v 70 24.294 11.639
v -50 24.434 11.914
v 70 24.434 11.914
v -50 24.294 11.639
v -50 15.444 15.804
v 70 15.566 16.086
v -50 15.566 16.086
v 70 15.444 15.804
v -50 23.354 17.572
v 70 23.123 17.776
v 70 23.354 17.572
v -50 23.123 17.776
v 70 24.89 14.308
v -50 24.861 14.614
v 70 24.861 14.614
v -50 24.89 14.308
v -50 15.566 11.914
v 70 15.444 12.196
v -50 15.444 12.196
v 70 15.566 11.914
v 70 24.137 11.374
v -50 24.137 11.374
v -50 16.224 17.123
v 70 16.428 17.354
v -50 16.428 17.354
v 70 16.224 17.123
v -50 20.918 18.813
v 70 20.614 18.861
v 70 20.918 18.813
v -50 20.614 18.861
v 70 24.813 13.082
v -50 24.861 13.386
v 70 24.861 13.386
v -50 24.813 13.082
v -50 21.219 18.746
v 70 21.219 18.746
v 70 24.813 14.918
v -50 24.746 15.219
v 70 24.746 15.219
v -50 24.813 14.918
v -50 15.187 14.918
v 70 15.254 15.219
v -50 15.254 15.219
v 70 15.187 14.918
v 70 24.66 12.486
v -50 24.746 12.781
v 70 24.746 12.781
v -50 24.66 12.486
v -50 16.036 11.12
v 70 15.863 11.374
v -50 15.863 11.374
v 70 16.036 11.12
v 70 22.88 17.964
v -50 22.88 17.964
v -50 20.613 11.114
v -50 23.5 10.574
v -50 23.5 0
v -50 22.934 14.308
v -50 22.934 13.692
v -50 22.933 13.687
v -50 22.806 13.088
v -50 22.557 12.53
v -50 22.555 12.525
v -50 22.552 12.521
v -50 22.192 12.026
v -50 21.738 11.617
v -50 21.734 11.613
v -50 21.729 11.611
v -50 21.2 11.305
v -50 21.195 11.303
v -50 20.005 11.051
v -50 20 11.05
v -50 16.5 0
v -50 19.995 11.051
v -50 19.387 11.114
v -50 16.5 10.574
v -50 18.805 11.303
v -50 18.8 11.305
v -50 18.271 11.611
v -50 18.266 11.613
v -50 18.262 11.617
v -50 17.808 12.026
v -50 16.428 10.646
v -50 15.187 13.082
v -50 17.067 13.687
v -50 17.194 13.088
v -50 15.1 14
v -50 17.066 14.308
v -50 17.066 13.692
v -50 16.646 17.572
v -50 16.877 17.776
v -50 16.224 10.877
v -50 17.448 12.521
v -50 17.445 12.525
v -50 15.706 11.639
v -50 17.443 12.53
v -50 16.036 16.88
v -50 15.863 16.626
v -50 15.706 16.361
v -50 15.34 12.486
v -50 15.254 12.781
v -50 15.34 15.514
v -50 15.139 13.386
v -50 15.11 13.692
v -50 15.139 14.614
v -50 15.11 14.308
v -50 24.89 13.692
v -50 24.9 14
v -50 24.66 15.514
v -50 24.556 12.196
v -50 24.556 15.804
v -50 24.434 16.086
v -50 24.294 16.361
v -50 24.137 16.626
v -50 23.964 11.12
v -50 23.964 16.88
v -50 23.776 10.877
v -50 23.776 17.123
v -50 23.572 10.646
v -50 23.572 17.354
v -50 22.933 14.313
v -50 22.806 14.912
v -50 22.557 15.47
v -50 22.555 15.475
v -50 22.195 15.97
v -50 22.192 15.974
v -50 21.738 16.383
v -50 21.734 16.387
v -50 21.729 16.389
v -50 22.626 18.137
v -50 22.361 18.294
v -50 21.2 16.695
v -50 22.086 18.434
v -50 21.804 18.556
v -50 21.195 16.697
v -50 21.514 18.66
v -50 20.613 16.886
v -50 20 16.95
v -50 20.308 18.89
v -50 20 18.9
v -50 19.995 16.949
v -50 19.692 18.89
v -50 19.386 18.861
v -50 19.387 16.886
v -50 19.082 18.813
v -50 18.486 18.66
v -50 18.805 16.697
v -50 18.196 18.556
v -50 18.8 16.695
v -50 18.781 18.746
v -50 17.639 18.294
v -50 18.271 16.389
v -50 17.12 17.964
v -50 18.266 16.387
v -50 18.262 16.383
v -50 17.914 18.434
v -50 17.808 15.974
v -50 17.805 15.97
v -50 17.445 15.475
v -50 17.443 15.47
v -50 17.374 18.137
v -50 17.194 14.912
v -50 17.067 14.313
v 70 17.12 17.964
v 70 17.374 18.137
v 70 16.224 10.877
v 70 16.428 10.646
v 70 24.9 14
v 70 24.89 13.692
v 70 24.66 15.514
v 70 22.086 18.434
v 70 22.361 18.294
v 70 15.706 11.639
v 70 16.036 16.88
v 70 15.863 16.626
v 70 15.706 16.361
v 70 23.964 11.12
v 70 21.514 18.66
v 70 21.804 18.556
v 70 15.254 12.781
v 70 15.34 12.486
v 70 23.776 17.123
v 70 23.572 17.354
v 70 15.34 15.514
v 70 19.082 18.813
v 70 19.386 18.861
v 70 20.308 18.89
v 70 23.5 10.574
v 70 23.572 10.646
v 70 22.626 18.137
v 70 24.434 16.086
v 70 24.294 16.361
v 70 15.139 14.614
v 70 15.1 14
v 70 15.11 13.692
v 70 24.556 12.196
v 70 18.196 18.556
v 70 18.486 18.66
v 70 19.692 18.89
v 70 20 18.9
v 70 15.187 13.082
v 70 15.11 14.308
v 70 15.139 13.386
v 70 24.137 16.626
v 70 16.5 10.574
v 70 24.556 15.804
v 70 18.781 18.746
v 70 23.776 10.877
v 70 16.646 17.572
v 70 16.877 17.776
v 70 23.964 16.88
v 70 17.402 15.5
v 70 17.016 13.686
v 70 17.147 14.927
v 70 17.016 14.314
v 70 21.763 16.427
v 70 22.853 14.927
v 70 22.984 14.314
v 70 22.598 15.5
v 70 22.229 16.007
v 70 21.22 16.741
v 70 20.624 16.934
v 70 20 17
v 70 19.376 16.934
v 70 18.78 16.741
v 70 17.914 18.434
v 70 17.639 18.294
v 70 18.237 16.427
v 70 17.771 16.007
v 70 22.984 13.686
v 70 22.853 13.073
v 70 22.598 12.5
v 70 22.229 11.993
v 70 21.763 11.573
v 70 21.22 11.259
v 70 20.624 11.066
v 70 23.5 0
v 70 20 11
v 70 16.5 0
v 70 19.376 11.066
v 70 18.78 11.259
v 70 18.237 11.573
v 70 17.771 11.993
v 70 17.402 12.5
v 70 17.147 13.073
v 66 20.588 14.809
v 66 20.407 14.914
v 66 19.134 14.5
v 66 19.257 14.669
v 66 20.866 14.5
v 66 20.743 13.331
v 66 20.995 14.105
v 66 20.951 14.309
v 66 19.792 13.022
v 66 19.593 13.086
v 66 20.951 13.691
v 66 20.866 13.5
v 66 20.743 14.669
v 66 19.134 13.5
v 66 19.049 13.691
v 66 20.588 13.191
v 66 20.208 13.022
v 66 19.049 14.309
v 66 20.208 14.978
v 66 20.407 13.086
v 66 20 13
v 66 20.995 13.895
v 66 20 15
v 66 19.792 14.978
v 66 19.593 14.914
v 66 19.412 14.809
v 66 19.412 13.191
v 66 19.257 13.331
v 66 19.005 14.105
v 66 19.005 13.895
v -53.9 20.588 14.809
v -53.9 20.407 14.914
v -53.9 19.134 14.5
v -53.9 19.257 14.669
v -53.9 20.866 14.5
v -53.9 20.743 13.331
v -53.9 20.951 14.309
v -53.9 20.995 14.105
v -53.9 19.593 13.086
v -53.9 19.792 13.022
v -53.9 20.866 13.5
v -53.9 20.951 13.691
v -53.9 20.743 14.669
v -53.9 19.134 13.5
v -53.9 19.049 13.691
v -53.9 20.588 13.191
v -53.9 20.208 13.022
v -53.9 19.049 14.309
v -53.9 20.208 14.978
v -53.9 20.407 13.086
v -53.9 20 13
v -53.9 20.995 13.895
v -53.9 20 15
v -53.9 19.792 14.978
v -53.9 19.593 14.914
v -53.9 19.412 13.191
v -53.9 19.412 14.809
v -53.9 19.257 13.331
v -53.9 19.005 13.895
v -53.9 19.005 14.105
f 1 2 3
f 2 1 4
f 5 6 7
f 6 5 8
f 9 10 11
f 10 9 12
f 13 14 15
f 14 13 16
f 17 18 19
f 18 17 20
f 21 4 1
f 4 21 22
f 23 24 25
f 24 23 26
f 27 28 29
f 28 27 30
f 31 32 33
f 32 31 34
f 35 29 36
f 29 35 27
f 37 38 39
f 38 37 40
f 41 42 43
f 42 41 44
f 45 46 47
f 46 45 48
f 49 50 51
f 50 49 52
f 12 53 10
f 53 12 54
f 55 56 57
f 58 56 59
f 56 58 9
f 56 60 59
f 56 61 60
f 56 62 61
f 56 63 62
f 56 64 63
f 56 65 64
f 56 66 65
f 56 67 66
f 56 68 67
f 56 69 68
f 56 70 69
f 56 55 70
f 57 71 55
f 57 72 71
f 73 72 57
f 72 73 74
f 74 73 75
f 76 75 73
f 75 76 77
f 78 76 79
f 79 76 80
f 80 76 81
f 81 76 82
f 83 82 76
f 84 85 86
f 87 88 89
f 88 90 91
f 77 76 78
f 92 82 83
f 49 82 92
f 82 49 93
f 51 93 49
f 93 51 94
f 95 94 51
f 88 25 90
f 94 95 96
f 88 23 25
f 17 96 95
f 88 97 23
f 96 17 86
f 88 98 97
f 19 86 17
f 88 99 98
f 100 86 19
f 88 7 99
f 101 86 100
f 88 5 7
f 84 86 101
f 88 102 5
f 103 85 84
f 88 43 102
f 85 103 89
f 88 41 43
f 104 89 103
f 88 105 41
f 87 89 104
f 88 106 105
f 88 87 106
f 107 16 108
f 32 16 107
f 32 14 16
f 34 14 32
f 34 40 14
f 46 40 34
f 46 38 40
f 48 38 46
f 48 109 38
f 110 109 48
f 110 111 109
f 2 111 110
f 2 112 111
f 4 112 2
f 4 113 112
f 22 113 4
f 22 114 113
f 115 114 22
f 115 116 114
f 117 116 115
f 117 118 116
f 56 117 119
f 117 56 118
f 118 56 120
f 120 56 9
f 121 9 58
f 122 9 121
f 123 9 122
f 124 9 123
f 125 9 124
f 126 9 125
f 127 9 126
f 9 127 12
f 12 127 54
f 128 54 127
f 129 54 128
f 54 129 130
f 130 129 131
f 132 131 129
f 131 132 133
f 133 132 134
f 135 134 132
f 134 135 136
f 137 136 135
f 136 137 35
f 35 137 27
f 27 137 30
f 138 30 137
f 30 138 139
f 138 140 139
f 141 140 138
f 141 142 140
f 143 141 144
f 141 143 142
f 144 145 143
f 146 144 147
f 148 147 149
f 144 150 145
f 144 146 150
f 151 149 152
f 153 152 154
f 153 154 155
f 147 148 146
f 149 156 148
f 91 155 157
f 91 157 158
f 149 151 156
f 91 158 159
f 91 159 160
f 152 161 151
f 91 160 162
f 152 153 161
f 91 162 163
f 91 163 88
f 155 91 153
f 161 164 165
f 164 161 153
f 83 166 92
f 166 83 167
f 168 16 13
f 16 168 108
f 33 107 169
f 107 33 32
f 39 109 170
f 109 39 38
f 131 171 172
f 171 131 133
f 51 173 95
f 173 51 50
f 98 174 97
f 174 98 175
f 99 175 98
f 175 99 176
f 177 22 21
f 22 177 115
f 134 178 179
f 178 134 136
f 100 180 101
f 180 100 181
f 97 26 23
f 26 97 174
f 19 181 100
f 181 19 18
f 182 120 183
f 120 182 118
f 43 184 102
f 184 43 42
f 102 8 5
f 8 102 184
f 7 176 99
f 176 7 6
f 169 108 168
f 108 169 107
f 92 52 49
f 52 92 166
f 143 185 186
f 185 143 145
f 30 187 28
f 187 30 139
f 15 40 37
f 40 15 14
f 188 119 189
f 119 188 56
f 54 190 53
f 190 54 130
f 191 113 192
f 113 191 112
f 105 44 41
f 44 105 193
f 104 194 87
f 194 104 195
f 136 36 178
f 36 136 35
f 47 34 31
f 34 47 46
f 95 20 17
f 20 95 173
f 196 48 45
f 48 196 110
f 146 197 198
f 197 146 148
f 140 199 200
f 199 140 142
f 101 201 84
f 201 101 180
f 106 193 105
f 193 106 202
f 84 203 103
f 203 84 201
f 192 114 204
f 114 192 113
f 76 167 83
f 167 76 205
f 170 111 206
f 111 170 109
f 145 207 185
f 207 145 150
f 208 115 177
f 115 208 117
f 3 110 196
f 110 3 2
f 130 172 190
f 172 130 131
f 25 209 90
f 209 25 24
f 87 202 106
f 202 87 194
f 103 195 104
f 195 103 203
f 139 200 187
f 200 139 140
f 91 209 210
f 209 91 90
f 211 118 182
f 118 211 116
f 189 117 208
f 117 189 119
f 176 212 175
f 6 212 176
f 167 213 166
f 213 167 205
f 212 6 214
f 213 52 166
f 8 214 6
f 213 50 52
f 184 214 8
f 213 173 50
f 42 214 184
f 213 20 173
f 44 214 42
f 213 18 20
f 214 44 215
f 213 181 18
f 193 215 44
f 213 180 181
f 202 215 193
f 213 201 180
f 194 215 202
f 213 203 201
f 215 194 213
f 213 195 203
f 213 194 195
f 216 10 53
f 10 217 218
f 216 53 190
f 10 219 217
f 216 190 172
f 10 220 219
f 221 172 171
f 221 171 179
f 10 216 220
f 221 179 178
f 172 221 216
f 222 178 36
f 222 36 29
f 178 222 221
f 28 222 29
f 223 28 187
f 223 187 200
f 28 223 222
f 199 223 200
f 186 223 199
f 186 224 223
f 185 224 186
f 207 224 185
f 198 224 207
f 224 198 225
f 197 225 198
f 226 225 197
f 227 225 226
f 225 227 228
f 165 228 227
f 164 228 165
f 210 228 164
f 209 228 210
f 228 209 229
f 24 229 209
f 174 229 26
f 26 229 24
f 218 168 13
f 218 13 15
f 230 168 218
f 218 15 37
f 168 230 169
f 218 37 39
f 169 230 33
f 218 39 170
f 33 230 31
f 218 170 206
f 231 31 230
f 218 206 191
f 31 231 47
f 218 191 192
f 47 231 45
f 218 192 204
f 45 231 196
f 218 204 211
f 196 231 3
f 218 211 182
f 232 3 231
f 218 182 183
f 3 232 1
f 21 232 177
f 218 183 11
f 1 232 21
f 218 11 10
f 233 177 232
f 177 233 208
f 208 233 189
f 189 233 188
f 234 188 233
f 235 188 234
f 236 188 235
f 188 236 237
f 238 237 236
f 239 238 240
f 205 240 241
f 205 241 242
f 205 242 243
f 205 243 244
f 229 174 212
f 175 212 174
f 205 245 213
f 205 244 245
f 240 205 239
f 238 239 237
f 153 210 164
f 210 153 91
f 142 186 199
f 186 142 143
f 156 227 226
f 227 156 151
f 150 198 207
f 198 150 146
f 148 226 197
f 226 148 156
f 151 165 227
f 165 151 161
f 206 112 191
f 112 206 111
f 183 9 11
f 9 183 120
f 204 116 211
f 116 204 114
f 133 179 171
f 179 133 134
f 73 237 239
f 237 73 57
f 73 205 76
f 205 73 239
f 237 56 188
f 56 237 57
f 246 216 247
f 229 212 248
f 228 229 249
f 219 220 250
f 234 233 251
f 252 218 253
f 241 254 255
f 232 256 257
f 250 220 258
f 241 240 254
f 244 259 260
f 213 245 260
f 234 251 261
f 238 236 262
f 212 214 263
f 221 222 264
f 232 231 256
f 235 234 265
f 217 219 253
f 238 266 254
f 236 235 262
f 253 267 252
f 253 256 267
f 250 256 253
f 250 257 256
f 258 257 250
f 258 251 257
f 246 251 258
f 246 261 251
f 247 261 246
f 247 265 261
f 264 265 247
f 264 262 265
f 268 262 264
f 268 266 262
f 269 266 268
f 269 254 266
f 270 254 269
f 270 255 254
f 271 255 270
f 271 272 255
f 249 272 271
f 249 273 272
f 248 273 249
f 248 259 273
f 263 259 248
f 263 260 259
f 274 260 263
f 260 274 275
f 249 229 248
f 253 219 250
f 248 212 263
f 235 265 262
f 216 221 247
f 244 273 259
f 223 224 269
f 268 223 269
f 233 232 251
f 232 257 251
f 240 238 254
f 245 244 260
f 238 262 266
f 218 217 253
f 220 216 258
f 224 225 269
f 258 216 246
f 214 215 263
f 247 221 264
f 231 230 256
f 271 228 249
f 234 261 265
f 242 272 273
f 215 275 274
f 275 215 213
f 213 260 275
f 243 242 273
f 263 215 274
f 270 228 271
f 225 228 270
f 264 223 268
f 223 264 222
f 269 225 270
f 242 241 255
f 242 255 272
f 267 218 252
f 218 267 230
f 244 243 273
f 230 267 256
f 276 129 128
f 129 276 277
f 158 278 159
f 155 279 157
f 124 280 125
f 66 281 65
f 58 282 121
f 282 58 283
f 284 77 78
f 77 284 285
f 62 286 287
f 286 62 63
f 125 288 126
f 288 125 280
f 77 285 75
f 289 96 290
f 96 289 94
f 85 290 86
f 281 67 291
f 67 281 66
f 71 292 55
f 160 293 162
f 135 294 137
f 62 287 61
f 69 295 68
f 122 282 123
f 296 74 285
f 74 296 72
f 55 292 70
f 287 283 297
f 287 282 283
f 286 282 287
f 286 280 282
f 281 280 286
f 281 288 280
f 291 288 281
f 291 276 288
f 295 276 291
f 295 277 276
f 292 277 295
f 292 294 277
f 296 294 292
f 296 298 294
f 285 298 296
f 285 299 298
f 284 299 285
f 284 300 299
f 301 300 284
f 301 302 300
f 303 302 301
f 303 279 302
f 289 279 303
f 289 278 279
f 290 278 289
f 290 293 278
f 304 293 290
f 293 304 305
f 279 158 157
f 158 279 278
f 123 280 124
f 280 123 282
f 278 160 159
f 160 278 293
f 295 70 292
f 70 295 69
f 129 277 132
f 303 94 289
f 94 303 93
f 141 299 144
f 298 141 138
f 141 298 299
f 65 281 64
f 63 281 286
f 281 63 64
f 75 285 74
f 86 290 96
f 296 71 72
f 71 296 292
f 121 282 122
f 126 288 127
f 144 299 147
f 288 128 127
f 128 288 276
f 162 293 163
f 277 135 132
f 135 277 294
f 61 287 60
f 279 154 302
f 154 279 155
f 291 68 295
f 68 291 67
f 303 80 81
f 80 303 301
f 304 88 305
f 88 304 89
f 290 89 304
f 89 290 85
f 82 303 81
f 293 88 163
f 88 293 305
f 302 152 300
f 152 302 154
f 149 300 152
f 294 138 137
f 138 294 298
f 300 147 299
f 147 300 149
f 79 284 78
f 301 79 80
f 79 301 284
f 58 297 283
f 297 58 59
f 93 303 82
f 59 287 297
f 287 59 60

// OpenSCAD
// file: key.scad
module key_shape(height) {
    cylinder(h = height, r = 4.9, $fn = 100);
    translate([0, -3.5, 0])
    cube([14, 7, height]);
}
// main file
use <key.scad>;

height = 120;

difference() {
    rotate([180, 90, 0]) translate([-14, -20, -70]) key_shape((height));
    rotate([0, 270, 0]) translate([14, 20, -70]) cylinder(4, 3, $fn = 30);
}

rotate([0, 270, 0]) translate([14, 20, height - 70.1]) cylinder(4, 3, $fn = 30);
